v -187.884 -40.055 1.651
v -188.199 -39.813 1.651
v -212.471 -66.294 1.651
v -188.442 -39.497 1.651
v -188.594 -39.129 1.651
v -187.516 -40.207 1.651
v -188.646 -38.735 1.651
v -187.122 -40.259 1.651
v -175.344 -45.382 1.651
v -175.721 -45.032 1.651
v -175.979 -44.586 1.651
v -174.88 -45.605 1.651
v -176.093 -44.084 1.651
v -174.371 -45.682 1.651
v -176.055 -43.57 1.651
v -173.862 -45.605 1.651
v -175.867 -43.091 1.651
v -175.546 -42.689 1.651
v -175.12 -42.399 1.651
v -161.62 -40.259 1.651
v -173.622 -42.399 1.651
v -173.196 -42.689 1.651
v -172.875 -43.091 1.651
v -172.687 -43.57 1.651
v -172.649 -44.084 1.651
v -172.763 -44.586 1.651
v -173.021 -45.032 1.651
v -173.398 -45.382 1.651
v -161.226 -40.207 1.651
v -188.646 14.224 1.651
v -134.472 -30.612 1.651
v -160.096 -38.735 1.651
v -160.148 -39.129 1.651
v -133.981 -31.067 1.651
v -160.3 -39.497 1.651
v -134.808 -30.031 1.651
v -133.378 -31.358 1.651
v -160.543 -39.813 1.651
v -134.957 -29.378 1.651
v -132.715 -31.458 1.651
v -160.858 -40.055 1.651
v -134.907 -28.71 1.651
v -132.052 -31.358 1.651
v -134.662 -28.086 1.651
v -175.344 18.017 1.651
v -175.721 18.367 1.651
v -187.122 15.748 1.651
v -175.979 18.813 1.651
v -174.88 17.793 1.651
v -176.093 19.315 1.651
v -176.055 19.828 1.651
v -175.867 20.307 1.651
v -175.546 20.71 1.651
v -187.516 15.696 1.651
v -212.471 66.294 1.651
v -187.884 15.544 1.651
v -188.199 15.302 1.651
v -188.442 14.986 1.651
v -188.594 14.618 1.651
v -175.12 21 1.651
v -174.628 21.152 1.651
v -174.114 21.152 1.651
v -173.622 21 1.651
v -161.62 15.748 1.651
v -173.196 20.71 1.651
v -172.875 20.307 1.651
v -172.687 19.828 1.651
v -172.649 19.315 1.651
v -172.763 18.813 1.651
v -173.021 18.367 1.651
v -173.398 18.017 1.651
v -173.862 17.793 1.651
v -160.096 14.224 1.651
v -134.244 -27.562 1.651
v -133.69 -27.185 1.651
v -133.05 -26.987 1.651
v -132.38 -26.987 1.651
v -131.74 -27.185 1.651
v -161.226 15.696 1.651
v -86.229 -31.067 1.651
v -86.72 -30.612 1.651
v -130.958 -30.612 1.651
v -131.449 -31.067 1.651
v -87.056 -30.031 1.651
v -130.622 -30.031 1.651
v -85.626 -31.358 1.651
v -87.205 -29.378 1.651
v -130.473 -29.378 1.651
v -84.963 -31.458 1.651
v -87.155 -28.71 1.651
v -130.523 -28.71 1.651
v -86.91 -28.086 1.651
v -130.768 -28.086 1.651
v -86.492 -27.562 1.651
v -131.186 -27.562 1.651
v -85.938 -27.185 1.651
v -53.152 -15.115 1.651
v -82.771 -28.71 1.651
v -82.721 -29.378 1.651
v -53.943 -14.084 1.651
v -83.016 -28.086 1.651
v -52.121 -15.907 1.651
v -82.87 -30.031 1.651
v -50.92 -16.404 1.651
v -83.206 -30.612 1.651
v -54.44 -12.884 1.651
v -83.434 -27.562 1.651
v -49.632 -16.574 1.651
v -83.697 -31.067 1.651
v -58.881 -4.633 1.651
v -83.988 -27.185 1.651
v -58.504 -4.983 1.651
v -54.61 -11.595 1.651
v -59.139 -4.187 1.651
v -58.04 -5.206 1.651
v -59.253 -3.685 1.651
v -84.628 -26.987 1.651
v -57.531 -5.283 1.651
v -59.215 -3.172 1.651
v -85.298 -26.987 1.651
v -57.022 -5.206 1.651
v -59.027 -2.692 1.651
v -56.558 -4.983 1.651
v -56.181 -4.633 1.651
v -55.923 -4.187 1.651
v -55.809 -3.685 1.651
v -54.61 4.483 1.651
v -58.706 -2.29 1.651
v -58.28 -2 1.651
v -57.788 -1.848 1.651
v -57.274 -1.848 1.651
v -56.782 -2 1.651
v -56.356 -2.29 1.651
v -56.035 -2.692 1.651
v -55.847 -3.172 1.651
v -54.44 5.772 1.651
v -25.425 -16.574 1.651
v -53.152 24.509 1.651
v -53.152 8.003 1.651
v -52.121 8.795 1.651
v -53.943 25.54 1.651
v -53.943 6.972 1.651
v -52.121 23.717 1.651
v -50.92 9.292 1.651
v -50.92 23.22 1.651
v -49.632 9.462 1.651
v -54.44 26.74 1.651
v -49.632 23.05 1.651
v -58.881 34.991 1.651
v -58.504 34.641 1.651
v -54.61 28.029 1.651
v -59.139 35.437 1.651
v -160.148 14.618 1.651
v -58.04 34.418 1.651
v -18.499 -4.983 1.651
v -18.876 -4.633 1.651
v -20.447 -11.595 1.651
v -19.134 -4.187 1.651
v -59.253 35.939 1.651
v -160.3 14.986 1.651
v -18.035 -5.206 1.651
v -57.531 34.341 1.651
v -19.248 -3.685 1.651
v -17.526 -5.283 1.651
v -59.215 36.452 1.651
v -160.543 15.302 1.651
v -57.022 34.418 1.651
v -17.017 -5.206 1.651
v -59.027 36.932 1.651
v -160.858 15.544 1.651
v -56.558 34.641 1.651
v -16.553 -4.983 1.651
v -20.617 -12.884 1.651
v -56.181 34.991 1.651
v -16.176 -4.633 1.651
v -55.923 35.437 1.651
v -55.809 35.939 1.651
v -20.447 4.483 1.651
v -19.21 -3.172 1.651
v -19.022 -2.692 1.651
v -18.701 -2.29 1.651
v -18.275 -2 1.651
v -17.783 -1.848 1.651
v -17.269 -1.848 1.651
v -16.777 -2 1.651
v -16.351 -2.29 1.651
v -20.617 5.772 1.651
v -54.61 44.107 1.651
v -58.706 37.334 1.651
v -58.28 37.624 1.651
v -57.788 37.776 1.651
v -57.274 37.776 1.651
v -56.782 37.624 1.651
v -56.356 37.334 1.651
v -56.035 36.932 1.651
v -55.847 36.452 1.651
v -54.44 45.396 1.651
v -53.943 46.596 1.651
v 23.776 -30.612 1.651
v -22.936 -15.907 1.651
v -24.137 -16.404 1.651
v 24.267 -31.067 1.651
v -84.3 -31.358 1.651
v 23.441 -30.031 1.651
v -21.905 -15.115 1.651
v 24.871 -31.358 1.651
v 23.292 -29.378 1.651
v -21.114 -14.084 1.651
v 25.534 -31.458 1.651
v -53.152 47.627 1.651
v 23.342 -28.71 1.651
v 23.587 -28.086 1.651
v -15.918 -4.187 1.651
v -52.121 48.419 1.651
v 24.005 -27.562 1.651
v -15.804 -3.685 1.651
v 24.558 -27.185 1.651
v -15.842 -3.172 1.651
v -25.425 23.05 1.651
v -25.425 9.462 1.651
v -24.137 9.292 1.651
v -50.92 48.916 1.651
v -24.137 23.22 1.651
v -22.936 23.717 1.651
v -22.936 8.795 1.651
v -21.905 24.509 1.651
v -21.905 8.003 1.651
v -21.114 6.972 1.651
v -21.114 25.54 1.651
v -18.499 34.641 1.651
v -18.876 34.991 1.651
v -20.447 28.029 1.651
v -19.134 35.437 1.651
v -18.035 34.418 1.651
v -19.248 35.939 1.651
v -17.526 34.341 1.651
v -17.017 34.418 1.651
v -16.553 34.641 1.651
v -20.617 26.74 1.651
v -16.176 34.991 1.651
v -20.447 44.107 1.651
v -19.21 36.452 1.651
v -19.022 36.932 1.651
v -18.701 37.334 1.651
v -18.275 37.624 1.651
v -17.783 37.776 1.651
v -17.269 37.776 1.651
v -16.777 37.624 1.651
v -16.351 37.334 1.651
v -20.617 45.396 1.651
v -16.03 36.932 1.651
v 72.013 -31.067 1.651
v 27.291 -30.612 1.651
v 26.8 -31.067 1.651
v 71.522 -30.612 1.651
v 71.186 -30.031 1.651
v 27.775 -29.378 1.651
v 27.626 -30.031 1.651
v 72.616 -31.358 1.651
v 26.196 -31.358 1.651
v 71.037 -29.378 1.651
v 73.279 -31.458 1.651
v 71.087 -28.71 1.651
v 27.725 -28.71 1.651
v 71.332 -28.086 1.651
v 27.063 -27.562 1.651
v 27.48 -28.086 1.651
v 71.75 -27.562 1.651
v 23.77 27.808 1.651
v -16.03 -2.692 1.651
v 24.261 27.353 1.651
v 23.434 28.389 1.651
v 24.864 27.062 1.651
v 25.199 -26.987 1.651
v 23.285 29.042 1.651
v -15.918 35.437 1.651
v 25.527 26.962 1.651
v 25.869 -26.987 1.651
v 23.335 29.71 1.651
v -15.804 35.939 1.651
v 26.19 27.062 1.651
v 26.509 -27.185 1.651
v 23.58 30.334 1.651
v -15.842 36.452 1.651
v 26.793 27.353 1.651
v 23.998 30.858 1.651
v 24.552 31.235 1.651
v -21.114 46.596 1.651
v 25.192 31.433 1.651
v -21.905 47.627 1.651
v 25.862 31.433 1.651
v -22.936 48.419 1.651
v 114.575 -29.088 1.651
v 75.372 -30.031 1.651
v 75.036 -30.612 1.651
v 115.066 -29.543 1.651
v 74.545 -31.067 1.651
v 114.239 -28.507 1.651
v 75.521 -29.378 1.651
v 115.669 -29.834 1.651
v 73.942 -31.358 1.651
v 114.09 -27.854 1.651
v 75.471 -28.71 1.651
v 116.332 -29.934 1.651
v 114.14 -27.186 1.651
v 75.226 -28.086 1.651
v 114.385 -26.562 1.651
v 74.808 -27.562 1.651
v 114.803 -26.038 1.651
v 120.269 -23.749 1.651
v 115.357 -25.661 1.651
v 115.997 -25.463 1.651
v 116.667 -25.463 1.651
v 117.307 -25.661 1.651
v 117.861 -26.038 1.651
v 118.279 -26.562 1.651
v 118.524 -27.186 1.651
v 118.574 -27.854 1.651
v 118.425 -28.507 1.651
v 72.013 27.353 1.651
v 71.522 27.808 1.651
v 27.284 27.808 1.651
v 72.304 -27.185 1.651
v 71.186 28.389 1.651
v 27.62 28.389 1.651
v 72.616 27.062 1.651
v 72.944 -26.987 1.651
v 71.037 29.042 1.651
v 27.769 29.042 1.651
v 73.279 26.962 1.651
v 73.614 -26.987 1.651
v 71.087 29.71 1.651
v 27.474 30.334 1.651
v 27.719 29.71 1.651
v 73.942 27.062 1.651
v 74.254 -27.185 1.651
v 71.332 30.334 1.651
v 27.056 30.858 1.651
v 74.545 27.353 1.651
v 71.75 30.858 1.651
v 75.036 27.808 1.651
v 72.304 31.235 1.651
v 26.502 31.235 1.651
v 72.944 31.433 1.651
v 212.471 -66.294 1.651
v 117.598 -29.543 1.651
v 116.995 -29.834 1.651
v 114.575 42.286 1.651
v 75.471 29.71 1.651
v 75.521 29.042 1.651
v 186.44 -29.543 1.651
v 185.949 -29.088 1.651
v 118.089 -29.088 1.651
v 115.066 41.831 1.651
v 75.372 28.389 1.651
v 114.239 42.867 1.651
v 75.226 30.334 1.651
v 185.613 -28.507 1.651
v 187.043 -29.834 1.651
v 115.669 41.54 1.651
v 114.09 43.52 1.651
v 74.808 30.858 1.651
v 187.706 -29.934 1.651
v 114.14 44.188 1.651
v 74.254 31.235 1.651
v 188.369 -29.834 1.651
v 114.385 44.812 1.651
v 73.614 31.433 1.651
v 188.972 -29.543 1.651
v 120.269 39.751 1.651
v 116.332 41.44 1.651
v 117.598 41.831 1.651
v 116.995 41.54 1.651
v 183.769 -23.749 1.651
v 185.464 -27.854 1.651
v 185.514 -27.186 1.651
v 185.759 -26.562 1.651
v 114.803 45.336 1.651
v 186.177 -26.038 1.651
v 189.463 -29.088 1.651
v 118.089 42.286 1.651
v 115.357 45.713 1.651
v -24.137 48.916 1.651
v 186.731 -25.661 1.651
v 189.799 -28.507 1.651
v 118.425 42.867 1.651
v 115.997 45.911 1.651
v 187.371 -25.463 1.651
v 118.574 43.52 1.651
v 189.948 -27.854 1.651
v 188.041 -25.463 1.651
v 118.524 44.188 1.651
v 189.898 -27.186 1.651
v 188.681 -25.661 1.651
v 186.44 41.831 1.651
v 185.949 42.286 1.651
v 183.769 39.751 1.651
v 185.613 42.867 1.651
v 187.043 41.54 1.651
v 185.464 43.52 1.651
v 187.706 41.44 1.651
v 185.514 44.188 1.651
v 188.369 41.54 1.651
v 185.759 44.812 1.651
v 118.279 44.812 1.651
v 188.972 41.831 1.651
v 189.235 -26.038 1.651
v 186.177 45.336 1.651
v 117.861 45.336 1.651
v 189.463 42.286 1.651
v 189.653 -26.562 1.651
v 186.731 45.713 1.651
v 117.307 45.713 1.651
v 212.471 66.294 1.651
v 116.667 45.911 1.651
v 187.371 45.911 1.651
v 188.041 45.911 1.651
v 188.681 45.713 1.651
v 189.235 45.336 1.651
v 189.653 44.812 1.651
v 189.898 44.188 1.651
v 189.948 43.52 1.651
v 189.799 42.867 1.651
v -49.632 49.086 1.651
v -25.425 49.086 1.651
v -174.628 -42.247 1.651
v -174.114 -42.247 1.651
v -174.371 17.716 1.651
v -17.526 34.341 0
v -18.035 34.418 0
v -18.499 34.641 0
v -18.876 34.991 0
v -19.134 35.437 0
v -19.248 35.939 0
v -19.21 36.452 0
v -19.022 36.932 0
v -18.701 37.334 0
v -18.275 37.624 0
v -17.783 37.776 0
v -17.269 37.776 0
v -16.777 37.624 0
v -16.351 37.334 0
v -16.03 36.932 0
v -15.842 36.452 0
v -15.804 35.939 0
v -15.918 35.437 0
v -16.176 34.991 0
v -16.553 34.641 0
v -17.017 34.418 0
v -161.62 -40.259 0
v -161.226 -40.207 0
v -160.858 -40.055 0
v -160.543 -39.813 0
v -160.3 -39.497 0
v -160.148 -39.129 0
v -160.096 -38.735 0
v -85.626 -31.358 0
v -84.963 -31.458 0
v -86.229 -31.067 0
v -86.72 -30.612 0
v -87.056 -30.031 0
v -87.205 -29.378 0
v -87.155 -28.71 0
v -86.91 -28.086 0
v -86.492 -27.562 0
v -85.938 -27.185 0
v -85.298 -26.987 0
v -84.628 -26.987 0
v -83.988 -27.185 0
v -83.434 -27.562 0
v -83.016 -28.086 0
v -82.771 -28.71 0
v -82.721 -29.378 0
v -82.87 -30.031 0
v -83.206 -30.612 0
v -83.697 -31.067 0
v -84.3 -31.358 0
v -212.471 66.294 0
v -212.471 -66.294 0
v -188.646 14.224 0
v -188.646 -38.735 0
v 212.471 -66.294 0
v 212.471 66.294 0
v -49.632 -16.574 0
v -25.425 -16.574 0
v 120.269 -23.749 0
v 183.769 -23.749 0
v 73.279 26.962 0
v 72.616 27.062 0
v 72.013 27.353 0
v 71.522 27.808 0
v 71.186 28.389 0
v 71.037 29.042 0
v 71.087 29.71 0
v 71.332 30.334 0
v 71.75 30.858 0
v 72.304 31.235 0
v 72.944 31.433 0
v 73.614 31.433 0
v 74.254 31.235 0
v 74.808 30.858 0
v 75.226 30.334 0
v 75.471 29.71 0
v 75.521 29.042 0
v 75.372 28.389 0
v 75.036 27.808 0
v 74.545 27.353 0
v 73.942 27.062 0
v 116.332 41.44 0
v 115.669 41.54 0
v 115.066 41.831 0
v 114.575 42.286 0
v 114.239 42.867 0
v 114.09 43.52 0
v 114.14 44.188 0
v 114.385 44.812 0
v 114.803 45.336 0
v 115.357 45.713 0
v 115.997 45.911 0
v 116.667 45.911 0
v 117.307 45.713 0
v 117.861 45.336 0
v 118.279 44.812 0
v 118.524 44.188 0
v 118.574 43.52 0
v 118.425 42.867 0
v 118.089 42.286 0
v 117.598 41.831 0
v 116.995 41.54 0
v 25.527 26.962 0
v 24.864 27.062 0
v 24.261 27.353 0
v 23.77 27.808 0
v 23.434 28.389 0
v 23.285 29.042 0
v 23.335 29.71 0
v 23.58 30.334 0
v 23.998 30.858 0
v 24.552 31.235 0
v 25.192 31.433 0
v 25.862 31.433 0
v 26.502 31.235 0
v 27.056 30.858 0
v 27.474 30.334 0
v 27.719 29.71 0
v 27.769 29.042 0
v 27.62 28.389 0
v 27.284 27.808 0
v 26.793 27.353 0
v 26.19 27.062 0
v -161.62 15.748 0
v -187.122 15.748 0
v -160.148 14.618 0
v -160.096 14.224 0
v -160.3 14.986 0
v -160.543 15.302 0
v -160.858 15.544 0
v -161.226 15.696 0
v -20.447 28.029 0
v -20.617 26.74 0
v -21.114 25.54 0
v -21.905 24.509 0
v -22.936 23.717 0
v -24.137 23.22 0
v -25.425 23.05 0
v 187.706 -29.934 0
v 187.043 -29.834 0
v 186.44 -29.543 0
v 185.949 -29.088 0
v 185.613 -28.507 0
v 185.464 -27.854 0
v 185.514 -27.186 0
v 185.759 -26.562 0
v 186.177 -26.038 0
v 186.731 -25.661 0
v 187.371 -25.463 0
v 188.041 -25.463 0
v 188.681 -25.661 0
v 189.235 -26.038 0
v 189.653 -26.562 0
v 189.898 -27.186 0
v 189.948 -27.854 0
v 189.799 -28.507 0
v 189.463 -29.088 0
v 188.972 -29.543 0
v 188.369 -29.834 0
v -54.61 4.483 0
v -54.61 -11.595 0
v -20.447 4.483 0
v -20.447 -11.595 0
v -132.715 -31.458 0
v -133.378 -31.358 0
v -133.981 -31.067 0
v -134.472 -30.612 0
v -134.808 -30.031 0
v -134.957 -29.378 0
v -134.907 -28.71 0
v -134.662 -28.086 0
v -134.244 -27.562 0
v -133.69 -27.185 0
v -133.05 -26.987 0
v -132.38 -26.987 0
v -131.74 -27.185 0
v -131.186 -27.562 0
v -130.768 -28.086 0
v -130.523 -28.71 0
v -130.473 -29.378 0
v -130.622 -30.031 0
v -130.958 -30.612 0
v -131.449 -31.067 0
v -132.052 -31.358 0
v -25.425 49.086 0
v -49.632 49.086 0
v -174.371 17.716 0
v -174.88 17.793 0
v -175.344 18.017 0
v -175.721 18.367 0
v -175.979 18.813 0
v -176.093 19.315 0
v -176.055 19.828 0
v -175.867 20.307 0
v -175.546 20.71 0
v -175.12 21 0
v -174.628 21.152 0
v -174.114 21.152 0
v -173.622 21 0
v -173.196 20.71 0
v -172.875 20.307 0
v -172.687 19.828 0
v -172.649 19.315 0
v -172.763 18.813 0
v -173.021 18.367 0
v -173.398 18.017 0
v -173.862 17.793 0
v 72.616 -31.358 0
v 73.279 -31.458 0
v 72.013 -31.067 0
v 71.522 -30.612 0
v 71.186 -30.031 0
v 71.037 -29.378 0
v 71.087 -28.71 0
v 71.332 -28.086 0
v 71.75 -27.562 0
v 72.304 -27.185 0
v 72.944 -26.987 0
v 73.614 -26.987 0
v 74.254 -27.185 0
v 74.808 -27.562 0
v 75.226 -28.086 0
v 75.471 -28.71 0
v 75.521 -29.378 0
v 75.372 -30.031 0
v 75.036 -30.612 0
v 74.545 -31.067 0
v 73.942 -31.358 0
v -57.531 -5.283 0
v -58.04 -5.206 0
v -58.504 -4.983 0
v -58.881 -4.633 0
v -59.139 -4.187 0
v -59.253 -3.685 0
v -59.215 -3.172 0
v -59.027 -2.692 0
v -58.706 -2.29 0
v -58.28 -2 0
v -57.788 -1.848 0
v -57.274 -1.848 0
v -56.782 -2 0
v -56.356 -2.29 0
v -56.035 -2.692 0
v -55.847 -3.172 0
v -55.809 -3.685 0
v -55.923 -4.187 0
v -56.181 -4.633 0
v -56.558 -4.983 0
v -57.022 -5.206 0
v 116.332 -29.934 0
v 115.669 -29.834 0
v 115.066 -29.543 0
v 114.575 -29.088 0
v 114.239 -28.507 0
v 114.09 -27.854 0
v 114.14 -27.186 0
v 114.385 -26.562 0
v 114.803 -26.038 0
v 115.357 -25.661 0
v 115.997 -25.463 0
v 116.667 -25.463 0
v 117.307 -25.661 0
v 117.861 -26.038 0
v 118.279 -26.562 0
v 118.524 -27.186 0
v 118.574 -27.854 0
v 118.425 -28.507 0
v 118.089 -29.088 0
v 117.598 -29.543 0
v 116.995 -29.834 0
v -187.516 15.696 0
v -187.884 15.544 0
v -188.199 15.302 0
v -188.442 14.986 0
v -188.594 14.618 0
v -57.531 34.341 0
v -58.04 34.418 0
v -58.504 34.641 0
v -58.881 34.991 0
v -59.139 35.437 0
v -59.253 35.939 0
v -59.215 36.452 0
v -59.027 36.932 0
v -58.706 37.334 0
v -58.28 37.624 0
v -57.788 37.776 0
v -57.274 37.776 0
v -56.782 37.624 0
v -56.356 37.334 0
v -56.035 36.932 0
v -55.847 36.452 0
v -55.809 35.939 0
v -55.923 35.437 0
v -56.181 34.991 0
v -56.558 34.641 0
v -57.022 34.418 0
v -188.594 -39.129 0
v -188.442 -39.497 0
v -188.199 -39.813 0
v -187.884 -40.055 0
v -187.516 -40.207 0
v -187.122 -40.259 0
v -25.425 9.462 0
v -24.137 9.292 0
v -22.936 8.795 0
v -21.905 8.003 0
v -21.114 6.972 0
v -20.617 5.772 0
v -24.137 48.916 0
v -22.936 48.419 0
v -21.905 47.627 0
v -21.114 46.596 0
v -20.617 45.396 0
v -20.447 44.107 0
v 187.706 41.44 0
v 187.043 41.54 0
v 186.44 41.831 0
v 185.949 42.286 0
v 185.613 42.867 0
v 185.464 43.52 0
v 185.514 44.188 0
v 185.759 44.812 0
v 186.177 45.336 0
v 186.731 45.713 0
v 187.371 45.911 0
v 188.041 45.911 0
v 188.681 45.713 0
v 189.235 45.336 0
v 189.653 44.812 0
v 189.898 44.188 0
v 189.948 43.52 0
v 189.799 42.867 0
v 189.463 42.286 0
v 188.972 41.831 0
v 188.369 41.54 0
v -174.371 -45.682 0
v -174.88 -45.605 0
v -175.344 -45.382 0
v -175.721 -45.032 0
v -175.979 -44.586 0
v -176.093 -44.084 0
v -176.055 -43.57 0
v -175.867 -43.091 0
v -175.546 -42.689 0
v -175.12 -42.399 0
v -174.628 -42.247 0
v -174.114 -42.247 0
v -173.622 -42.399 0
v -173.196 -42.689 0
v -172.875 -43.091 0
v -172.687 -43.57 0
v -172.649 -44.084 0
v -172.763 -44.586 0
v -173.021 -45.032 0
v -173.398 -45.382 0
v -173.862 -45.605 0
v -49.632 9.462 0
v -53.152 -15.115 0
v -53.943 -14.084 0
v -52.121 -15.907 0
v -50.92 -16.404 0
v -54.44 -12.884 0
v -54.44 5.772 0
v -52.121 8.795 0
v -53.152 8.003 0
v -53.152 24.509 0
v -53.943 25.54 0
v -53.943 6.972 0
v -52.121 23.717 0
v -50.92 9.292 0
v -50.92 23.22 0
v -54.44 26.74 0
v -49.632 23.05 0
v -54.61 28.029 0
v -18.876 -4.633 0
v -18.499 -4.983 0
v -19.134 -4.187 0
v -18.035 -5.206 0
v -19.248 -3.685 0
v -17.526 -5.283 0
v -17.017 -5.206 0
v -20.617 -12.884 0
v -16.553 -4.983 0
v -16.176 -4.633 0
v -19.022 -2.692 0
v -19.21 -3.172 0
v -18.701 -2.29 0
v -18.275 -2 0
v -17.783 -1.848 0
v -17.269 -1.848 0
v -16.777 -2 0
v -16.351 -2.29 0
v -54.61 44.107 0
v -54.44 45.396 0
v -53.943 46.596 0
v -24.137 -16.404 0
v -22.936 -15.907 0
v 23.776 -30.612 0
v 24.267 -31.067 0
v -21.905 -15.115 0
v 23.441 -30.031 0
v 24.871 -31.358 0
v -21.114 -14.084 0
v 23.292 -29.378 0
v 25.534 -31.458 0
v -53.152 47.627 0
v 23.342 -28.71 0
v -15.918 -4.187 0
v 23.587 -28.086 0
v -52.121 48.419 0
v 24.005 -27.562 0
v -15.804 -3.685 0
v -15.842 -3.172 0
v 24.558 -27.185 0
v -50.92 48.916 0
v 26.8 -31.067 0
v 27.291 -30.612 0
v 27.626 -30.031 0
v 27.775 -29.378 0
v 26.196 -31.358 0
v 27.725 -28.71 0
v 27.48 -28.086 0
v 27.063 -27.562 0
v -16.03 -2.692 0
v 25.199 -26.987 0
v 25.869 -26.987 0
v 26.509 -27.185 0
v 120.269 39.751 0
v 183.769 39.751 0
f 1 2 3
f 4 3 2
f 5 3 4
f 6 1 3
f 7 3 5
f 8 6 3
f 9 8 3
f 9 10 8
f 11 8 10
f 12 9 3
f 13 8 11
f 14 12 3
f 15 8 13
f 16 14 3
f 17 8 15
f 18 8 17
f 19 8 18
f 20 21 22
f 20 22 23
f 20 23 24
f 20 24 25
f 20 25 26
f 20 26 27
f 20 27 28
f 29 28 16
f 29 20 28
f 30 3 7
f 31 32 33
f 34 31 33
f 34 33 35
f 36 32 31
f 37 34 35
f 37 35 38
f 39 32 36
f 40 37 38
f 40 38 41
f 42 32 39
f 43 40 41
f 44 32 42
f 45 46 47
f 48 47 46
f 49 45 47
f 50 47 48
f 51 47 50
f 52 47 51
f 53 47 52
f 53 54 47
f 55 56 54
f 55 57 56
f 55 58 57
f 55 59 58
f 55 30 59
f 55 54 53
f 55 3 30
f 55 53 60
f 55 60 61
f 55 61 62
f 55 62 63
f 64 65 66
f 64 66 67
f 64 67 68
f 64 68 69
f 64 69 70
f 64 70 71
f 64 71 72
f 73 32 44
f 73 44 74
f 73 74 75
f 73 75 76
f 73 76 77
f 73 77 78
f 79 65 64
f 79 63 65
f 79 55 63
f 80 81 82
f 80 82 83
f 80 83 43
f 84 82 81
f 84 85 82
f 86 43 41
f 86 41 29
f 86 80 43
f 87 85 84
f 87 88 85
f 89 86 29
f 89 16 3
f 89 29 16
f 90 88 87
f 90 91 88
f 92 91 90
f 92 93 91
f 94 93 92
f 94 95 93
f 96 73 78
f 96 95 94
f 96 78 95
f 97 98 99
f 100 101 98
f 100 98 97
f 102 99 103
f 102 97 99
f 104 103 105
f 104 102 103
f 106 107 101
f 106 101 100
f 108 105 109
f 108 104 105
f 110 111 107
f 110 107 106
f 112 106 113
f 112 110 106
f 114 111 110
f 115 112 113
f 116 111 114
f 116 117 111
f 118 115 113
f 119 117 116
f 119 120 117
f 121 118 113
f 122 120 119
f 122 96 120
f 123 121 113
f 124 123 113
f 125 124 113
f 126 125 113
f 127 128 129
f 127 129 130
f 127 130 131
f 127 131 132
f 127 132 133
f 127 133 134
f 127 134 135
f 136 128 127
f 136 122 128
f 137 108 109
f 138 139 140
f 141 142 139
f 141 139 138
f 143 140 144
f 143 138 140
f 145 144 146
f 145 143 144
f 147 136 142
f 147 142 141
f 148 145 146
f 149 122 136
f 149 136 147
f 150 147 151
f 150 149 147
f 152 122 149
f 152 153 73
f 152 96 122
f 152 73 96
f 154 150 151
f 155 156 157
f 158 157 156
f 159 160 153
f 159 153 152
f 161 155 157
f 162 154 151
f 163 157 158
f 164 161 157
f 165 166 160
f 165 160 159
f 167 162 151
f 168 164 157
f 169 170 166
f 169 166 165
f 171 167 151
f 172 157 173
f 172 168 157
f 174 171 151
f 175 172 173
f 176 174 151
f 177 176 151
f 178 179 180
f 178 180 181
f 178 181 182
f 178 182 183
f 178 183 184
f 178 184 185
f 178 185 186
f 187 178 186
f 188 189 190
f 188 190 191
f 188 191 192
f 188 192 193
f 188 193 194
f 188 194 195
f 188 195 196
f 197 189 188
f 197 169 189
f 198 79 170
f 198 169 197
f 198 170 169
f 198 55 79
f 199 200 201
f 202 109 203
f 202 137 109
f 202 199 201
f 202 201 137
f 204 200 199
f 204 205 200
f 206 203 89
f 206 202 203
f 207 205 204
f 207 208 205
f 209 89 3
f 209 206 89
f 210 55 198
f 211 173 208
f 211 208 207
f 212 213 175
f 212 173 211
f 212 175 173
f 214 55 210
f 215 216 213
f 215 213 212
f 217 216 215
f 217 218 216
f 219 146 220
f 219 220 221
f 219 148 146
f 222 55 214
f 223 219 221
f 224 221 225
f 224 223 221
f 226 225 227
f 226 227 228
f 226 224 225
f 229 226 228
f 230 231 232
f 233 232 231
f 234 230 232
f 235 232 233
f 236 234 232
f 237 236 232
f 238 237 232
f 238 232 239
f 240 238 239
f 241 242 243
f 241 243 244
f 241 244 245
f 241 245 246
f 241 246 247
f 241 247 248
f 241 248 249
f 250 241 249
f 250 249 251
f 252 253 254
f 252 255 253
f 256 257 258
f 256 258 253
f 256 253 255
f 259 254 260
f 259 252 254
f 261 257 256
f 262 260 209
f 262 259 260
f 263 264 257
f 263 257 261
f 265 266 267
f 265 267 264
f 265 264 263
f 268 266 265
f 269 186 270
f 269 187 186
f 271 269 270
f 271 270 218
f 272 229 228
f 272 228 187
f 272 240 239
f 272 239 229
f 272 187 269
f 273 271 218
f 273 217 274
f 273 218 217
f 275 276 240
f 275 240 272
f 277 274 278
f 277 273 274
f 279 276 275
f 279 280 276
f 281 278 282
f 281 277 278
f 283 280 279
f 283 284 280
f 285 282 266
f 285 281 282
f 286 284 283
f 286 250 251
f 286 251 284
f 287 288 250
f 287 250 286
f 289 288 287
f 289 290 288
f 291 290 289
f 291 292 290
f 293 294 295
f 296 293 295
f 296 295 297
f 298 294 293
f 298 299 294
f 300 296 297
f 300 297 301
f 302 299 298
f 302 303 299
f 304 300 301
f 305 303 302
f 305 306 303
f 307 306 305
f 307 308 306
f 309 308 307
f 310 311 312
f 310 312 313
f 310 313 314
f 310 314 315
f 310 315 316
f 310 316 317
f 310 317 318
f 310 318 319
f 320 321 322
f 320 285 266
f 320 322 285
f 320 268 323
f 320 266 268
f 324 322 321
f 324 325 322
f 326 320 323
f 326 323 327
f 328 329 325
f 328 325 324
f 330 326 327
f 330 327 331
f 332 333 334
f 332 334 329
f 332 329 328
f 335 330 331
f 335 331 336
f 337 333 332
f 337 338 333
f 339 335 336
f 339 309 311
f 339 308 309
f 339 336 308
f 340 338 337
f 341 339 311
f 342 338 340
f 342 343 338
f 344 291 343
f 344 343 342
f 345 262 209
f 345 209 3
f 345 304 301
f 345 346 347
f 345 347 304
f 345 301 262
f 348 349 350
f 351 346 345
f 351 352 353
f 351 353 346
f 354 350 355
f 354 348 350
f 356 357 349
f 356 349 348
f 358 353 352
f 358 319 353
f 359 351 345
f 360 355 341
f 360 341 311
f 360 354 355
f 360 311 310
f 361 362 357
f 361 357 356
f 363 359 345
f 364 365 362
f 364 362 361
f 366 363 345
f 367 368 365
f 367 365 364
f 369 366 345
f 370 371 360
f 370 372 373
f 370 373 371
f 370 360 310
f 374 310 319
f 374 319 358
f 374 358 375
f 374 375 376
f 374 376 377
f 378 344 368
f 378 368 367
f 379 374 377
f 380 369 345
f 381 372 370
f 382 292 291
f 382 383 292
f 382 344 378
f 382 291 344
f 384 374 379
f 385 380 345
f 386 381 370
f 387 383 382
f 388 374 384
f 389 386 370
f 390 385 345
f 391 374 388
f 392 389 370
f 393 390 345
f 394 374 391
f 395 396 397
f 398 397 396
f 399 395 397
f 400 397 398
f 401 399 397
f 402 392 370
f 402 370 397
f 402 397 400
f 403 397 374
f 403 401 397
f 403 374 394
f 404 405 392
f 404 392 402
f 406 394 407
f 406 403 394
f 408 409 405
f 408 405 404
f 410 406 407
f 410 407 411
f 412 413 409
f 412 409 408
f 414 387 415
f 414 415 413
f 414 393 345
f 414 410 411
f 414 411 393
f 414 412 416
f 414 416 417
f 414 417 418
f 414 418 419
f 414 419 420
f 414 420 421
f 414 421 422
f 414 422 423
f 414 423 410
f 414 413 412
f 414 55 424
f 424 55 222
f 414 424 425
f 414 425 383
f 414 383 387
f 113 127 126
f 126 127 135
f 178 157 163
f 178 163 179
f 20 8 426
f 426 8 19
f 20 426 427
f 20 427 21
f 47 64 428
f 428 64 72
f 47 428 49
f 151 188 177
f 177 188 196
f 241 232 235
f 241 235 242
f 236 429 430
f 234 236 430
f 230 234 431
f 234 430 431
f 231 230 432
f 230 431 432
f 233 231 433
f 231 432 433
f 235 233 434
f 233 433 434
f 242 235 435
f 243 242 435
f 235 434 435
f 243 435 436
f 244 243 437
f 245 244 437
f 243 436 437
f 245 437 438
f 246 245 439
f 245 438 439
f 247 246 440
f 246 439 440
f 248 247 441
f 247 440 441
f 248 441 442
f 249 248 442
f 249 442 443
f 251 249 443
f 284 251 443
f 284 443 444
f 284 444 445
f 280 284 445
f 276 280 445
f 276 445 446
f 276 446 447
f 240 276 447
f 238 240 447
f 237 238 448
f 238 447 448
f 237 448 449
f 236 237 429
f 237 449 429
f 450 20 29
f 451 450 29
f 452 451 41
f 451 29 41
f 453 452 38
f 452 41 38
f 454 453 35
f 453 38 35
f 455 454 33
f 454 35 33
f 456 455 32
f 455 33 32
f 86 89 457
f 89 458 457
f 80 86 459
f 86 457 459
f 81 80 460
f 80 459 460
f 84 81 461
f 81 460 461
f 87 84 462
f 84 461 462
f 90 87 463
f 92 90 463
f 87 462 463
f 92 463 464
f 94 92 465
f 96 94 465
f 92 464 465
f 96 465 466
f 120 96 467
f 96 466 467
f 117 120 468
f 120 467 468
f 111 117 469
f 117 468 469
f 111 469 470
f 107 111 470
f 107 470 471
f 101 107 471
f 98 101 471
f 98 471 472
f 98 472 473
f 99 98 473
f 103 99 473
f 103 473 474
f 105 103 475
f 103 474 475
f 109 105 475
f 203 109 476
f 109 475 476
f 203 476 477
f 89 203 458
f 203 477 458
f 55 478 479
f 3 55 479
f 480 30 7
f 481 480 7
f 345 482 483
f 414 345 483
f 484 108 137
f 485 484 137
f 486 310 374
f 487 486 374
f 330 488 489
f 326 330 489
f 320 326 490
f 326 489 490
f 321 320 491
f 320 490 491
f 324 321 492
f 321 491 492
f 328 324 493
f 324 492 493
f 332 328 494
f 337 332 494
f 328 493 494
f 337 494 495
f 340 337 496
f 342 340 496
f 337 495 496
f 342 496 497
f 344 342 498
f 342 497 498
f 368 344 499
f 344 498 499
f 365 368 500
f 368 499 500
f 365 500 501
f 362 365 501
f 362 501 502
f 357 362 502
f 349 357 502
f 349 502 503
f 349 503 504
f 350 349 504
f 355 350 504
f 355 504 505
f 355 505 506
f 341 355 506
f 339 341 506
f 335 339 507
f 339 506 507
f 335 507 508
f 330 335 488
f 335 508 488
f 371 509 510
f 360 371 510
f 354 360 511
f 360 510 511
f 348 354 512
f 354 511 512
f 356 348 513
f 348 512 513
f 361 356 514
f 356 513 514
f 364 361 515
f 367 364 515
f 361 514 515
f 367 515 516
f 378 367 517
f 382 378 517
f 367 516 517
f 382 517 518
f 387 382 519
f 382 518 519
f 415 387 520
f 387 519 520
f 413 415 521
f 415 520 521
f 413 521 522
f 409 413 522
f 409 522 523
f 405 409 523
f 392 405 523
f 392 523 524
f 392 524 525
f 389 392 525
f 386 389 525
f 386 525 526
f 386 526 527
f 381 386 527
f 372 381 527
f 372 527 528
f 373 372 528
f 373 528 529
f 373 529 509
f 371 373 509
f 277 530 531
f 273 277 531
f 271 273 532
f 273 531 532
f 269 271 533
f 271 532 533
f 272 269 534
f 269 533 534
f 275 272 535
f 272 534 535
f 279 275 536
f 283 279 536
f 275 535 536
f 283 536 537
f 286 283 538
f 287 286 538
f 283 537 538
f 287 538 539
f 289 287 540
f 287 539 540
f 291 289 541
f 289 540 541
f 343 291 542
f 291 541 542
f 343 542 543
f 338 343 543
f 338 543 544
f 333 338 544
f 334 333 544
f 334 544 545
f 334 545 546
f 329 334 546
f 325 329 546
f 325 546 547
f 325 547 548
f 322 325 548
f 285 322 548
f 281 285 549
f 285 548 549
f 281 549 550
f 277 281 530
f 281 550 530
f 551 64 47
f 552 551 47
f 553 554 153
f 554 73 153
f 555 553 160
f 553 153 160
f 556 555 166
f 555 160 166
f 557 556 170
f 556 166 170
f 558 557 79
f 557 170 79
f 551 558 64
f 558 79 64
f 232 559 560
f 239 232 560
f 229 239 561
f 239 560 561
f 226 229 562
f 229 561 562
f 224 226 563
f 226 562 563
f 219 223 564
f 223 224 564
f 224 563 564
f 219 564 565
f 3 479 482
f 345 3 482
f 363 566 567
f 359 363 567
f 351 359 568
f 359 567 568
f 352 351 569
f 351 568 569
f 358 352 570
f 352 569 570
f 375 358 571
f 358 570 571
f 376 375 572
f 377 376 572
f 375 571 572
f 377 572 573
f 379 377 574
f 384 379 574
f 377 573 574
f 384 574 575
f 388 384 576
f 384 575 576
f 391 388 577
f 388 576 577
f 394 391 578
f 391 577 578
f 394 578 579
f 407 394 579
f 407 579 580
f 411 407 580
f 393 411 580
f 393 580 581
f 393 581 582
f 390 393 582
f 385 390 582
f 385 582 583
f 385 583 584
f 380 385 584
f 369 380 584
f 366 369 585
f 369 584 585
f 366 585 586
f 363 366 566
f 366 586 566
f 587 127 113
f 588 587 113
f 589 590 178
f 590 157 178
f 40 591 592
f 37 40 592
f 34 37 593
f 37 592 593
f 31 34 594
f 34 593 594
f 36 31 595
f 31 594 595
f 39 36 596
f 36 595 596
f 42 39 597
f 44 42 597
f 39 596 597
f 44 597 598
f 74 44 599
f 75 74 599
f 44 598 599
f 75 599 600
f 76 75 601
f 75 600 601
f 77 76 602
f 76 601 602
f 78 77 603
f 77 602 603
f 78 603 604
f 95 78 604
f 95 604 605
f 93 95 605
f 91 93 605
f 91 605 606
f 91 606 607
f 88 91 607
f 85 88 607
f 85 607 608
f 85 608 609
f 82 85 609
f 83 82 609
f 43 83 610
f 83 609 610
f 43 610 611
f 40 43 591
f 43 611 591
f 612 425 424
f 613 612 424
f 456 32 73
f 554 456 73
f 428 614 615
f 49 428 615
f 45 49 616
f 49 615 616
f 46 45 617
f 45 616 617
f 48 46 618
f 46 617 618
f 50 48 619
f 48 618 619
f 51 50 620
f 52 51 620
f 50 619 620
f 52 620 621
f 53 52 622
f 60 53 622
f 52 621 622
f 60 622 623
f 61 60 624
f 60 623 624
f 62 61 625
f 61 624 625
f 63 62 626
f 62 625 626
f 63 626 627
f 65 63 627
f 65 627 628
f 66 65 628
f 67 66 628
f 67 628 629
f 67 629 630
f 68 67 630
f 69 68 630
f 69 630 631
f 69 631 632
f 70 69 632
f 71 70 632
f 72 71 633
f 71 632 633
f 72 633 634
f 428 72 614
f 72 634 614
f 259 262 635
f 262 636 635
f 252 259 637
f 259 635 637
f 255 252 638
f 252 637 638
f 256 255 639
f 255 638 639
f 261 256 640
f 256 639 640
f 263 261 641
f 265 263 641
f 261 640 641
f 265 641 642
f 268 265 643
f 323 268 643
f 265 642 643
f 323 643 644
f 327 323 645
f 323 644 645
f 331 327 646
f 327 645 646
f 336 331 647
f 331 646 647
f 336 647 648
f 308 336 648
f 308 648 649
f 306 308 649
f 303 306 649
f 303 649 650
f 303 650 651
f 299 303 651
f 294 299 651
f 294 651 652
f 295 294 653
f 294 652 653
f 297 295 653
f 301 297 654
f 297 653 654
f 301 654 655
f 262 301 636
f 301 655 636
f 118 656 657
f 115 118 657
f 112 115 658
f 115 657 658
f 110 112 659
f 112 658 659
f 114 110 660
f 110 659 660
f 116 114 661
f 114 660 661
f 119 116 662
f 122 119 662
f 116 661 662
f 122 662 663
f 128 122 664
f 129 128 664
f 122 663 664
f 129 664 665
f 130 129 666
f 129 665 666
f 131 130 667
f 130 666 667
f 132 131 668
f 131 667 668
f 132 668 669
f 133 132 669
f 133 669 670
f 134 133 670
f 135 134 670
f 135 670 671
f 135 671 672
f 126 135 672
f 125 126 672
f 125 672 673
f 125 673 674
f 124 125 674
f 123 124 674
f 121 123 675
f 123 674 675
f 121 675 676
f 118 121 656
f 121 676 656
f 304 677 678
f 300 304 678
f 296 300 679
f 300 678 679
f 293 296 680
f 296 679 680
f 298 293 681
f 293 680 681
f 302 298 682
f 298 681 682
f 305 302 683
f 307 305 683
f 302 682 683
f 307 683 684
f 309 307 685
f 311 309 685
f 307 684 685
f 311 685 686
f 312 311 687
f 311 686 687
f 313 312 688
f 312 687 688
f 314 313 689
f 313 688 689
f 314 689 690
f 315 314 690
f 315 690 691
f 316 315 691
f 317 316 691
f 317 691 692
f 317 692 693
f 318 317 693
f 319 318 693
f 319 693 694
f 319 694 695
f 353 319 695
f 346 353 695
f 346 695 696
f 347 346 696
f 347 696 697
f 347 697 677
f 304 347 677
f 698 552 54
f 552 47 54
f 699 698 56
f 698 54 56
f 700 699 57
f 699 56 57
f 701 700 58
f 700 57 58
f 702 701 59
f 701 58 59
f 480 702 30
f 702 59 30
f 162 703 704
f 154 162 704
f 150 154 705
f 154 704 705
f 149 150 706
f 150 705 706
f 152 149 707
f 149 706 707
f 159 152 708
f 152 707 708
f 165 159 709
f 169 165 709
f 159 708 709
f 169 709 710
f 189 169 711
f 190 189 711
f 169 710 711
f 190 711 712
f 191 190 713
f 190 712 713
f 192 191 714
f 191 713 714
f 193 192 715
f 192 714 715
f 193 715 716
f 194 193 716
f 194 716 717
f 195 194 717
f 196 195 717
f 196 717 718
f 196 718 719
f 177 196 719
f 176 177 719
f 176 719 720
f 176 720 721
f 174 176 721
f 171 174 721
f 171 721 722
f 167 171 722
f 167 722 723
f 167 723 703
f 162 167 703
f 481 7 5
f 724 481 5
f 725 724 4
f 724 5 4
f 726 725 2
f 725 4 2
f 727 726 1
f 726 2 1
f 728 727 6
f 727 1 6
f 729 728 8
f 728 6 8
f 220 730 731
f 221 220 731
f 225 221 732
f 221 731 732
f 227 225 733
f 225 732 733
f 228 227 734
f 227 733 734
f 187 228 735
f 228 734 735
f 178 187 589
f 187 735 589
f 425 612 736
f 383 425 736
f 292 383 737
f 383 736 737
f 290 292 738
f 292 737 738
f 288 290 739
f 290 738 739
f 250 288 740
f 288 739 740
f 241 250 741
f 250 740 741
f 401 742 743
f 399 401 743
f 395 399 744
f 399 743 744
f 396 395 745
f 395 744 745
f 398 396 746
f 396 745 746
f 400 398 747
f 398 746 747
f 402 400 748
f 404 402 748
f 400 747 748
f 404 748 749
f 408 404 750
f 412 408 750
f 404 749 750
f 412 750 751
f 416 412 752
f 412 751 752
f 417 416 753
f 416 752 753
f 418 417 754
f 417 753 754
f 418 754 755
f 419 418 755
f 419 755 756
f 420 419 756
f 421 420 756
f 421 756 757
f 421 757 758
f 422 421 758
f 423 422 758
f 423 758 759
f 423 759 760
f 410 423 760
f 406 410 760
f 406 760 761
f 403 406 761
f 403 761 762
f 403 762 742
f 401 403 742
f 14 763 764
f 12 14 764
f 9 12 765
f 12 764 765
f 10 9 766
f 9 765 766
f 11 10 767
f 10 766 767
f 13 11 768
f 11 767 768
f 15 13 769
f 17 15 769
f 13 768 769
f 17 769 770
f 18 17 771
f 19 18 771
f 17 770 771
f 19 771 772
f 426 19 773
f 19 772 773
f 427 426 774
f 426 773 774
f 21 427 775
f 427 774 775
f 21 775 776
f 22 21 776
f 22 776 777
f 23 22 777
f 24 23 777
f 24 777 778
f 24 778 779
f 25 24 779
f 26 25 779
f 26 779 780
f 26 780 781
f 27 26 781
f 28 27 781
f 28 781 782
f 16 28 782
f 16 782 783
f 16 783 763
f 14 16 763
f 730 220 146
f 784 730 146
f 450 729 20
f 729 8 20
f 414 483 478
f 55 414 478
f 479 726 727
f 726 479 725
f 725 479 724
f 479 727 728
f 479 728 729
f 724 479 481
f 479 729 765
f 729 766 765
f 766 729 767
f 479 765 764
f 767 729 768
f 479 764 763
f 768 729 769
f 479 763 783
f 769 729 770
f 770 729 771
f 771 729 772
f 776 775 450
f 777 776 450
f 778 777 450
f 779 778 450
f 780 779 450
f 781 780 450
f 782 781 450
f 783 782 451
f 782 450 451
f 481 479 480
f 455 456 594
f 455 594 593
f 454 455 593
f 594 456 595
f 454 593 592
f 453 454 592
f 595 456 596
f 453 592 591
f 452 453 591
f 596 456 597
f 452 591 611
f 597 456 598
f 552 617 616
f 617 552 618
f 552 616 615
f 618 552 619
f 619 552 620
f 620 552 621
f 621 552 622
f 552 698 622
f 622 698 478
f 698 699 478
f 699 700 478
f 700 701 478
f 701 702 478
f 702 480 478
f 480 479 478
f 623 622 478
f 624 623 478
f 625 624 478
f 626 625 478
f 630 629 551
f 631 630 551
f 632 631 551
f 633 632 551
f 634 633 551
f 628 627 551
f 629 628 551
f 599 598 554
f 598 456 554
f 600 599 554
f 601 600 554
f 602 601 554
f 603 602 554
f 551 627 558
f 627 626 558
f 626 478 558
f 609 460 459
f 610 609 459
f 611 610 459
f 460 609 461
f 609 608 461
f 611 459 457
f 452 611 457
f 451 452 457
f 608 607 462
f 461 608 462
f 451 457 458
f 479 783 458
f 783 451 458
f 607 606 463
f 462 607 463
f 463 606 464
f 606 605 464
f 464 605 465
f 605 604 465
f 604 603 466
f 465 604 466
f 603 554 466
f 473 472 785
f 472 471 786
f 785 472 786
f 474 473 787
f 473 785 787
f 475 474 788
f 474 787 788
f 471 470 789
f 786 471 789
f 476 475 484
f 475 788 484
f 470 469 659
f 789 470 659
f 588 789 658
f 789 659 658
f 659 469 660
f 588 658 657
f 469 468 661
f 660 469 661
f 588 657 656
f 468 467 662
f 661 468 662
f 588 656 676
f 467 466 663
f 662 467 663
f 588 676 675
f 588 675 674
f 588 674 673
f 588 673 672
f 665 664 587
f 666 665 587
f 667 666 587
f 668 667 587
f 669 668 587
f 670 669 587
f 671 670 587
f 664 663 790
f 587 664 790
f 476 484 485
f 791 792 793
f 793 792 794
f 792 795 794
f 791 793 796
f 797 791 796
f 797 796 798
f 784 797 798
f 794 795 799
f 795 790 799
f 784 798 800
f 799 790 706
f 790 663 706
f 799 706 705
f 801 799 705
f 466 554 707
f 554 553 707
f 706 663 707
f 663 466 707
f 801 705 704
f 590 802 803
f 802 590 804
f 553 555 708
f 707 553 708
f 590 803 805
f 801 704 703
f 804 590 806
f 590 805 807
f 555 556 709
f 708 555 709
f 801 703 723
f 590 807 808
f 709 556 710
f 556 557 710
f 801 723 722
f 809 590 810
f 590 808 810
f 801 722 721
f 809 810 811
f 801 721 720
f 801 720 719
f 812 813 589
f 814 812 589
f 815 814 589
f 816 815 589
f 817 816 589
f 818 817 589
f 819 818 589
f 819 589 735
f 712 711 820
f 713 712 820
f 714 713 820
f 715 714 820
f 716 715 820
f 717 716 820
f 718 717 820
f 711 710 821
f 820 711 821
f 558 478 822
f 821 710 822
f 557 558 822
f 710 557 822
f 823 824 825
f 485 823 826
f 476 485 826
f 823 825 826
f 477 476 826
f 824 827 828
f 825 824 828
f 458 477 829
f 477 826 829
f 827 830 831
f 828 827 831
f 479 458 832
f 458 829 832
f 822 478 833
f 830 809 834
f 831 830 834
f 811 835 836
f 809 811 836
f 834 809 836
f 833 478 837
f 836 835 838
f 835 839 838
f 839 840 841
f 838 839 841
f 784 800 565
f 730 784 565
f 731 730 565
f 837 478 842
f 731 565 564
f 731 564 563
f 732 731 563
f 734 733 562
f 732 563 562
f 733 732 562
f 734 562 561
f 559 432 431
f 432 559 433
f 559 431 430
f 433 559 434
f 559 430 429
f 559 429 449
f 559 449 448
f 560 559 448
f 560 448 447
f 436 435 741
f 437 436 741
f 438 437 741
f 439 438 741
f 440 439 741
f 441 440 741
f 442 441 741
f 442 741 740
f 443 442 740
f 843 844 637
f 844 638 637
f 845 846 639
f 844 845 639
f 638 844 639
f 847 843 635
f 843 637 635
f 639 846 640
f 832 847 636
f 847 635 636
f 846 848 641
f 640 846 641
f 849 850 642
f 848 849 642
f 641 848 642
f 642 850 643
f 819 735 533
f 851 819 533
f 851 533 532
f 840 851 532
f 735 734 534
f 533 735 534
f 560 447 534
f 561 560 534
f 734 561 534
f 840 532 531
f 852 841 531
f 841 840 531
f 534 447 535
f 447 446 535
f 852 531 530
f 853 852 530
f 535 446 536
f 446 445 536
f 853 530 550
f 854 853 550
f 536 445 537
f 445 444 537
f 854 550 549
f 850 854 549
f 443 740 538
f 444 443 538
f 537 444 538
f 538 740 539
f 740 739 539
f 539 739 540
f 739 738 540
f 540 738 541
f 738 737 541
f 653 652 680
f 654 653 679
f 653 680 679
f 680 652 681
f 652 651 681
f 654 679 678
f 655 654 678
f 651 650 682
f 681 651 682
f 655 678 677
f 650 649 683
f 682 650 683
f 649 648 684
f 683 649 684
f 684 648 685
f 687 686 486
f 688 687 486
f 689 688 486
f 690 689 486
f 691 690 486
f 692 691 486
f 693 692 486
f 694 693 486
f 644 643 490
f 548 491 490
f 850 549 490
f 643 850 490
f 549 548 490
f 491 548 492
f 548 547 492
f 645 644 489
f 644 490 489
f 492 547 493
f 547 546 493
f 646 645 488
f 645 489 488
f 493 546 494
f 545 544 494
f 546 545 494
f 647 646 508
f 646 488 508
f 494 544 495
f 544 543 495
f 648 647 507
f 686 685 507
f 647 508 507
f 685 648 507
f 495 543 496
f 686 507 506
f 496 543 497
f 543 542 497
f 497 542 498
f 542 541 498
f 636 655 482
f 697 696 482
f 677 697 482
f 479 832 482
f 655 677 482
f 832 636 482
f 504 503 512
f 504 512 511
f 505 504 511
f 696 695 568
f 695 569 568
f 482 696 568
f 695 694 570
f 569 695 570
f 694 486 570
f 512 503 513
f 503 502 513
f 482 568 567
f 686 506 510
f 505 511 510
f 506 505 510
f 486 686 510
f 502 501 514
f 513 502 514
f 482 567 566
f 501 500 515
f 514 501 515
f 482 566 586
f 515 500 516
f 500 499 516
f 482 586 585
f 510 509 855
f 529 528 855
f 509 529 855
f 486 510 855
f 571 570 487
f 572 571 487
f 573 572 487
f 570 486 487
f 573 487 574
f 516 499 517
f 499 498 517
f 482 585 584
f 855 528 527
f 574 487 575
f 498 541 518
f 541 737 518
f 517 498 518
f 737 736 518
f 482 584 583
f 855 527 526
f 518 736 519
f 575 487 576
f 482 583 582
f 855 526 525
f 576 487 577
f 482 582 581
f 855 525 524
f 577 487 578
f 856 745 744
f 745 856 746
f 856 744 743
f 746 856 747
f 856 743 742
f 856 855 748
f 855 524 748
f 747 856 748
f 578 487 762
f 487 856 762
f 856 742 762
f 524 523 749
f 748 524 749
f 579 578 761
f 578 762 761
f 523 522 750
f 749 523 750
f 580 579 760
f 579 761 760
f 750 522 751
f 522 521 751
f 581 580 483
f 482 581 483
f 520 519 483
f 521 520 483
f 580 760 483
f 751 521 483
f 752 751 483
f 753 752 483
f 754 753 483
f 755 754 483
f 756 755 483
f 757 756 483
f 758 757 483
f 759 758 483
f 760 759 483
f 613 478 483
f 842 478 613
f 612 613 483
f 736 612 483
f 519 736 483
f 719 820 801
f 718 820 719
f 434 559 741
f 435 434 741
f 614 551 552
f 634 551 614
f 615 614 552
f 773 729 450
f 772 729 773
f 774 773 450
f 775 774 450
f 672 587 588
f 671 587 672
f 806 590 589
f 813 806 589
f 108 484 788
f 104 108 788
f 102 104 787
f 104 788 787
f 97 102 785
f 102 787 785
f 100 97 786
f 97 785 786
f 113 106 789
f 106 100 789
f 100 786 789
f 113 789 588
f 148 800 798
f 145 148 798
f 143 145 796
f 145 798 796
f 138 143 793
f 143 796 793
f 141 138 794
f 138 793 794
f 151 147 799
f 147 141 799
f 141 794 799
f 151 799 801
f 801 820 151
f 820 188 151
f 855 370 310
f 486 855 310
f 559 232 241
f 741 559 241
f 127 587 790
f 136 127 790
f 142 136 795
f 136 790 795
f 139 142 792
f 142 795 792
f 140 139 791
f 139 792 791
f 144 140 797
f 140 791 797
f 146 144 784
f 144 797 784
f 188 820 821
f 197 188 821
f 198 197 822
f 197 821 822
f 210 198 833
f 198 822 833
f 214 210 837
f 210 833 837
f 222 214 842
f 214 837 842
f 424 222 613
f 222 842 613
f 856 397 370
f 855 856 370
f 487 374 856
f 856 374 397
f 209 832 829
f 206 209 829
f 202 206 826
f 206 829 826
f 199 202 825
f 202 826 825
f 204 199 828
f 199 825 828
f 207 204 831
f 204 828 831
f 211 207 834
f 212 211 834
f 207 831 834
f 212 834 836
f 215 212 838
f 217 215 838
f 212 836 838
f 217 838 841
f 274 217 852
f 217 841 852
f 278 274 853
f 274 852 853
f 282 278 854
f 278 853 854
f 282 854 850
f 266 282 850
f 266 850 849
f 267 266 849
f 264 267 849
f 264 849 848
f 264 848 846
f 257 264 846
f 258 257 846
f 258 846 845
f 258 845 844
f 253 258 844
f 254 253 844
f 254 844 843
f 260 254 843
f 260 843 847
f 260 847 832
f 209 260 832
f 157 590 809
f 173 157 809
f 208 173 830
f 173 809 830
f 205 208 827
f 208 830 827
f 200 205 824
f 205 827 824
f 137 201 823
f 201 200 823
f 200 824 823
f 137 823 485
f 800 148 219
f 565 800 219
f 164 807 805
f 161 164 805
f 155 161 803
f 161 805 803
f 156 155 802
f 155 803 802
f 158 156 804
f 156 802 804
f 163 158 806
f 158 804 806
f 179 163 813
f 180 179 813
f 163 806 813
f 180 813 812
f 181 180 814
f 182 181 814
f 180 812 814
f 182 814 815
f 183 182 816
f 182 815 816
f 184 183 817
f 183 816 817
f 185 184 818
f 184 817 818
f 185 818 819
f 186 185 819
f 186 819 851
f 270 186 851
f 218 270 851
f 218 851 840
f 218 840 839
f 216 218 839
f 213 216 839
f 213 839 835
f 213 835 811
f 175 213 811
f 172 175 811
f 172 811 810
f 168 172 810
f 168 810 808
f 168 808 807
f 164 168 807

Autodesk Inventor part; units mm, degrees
ref_plane "YZ Plane" through (0, 0, 0) normal (1, 0, 0) x (0, 1, 0)
ref_plane "XZ Plane" through (0, 0, 0) normal (0, 1, 0) x (-1, 0, 0)
ref_plane "XY Plane" through (0, 0, 0) normal (0, 0, 1) x (1, 0, 0)
sketch "Sketch1" plane through (0, 0, 0) normal (0, 0, 1) x (1, 0, 0)
  line L0 (-212.471, -66.294) -> (212.471, -66.294)
  line L1 (212.471, -66.294) -> (212.471, 66.294)
  line L2 (212.471, 66.294) -> (-212.471, 66.294)
  line L3 (-212.471, 66.294) -> (-212.471, -66.294)
  line L4 (-212.471, -66.294) -> (212.471, 66.294) construction
  line L5 (212.471, -66.294) -> (-212.471, 66.294) construction
  point P0 (0, 0)
  dimension "d0" = 424.942
  dimension "d1" = 132.588
extrude "PDU back" add sketch "Sketch1" along normal blind 1.651
sketch "pwr entry" plane through (0, 0, 1.651) normal (0, 0, 1) x (1, 0, 0)
  line L0 (-187.1218, -40.259) -> (-161.6202, -40.259)
  line L1 (-160.0962, -38.735) -> (-160.0962, 14.224)
  line L2 (-161.6202, 15.748) -> (-187.1218, 15.748)
  line L3 (-188.6458, 14.224) -> (-188.6458, -38.735)
  line L4 (-188.6458, -40.259) -> (-160.0962, 15.748) construction
  line L5 (-160.0962, -40.259) -> (-188.6458, 15.748) construction
  line L6 (-174.371, 19.4437) -> (-174.371, -43.9547) construction
  line L7 (-212.471, 66.294) -> (-212.471, -66.294) projected
  line L8 (-212.471, -66.294) -> (212.471, -66.294) projected
  arc A0 (-160.0962, 14.224) -> (-161.6202, 15.748) centre (-161.6202, 14.224) ccw
  arc A1 (-187.1218, 15.748) -> (-188.6458, 14.224) centre (-187.1218, 14.224) ccw
  arc A2 (-188.6458, -38.735) -> (-187.1218, -40.259) centre (-187.1218, -38.735) ccw
  arc A3 (-161.6202, -40.259) -> (-160.0962, -38.735) centre (-161.6202, -38.735) ccw
  point P0 (0, 0)
  point P1 (-174.371, -12.2555)
  point P2 (-174.371, -12.2555)
  dimension "d4" = 56.007
  dimension "d5" = 28.5496
  dimension "d6" = 63.3984
  dimension "d7" = 38.1
  dimension "d8" = 22.3393
  dimension "d9" = 1.524
extrude "pwr entry cutout" cut sketch "pwr entry" against normal through all
hole "pwr entry holes" at (-174.371, 19.4437, 1.651) at (-174.371, -43.9547, 1.651) direction (0, 0, -1) diameter 3.4544 end through all
sketch "IEC outlet" plane through (0, 0, 1.651) normal (0, 0, 1) x (1, 0, 0)
  line L0 (-54.61, -16.5735) -> (-20.447, -16.5735)
  line L1 (-20.447, -16.5735) -> (-20.447, 9.4615)
  line L2 (-20.447, 9.4615) -> (-54.61, 9.4615)
  line L3 (-54.61, 9.4615) -> (-54.61, -16.5735)
  line L4 (-54.61, -16.5735) -> (-20.447, 9.4615) construction
  line L5 (-20.447, -16.5735) -> (-54.61, 9.4615) construction
  line L6 (-57.531, -3.556) -> (-17.526, -3.556) construction
  line L7 (-212.471, 66.294) -> (-212.471, -66.294) projected
  line L8 (-212.471, -66.294) -> (212.471, -66.294) projected
  line L9 (-54.61, 23.0505) -> (-20.447, 23.0505)
  line L10 (-20.447, 23.0505) -> (-20.447, 49.0855)
  line L11 (-20.447, 49.0855) -> (-54.61, 49.0855)
  line L12 (-54.61, 49.0855) -> (-54.61, 23.0505)
  line L13 (-54.61, 23.0505) -> (-20.447, 49.0855) construction
  line L14 (-20.447, 23.0505) -> (-54.61, 49.0855) construction
  line L15 (-57.531, 36.068) -> (-17.526, 36.068) construction
  point P0 (0, 0)
  point P1 (-37.5285, -3.556)
  point P2 (-37.5285, -3.556)
  point P3 (0, 39.624)
  point P4 (-37.5285, 36.068)
  point P5 (-37.5285, 36.068)
  dimension "d19" = 26.035
  dimension "d20" = 34.163
  dimension "d22" = 40.005
  dimension "d23" = 154.94
  dimension "d24" = 62.738
  dimension "d27" = 39.624
hole "IEC holes" at (-17.526, -3.556, 1.651) at (-57.531, -3.556, 1.651) at (-57.531, 36.068, 1.651) at (-17.526, 36.068, 1.651) direction (0, 0, -1) diameter 3.4544 end through all
extrude "IEC cutout" cut sketch "IEC outlet" against normal blind 25.4
sketch "airflow" plane through (0, 0, 1.651) normal (0, 0, 1) x (1, 0, 0)
  line L0 (110.109, -33.909) -> (193.929, -33.909) construction
  line L1 (193.929, -33.909) -> (193.929, 49.911) construction
  line L2 (193.929, 49.911) -> (110.109, 49.911) construction
  line L3 (110.109, 49.911) -> (110.109, -33.909) construction
  line L4 (110.109, -33.909) -> (193.929, 49.911) construction
  line L5 (193.929, -33.909) -> (110.109, 49.911) construction
  line L6 (-212.471, 66.294) -> (-212.471, -66.294) projected
  line L7 (-212.471, -66.294) -> (212.471, -66.294) projected
  line L8 (120.269, -23.749) -> (183.769, -23.749)
  line L9 (183.769, -23.749) -> (183.769, 39.751)
  line L10 (183.769, 39.751) -> (120.269, 39.751)
  line L11 (120.269, 39.751) -> (120.269, -23.749)
  line L12 (120.269, -23.749) -> (183.769, 39.751) construction
  line L13 (183.769, -23.749) -> (120.269, 39.751) construction
  line L14 (116.332, -27.686) -> (187.706, -27.686) construction
  line L15 (187.706, -27.686) -> (187.706, 43.688) construction
  line L16 (187.706, 43.688) -> (116.332, 43.688) construction
  line L17 (116.332, 43.688) -> (116.332, -27.686) construction
  line L18 (116.332, -27.686) -> (187.706, 43.688) construction
  line L19 (187.706, -27.686) -> (116.332, 43.688) construction
  point P0 (0, 0)
  point P1 (152.019, 8.001)
  dimension "d43" = 83.82
  dimension "d44" = 83.82
  dimension "d45" = 322.58
  dimension "d46" = 32.385
  dimension "d47" = 63.5
  dimension "d48" = 71.374
hole "airflow holes" at (187.706, 43.688, 1.651) at (116.332, 43.688, 1.651) at (116.332, -27.686, 1.651) at (187.706, -27.686, 1.651) direction (0, 0, -1) diameter 4.4958 end through all
extrude "airflow cutout" cut sketch "airflow" against normal through all
fillet "IEC fillet 1" radius 4.9784 4 edges at (-54.61, 49.0855, 0.8255) (-20.447, 49.0855, 0.8255) (-20.447, 23.0505, 0.8255) (-54.61, 23.0505, 0.8255)
fillet "IEC fillet 2" radius 4.9784 4 edges at (-54.61, 9.4615, 0.8255) (-54.61, -16.5735, 0.8255) (-20.447, 9.4615, 0.8255) (-20.447, -16.5735, 0.8255)
sketch "Sketch5" plane through (0, 0, 0) normal (0, 0, -1) x (-1, 0, 0)
  circle A0 centre (-116.332, 43.688) radius 2.2479 construction
  circle A1 centre (-116.332, -27.686) radius 2.2479 construction
  circle A2 centre (-116.332, -27.686) radius 2.2479 construction
  line L0 (-116.332, 43.688) -> (-116.332, -27.686) construction
  circle A3 centre (17.526, 36.068) radius 1.7272 construction
  circle A4 centre (17.526, -3.556) radius 1.7272 construction
  line L1 (17.526, 36.068) -> (17.526, -3.556) construction
  line L2 (-73.279, 29.21) -> (-25.527, 29.21) construction
  line L3 (84.963, -29.21) -> (132.715, -29.21) construction
  circle A5 centre (57.531, 36.068) radius 1.7272 construction
  line L4 (-25.5336, -29.21) -> (147.9977, -29.21) construction
  line L5 (84.9503, 23.1654) -> (84.9503, -54.0444) construction
  line L6 (-212.471, 66.294) -> (212.471, 66.294) projected
  point P0 (0, 0)
  point P1 (0, 0)
  point P2 (-73.279, -29.21)
  dimension "d60" = 58.42
  dimension "d61" = 47.752
  dimension "d62" = 27.432
  dimension "d63" = 47.752
  dimension "d64" = 43.053
  dimension "d73" = 95.504
  dimension "d74" = 95.504
  dimension "d75" = 95.504
sketch "Sketch6" plane through (0, 0, 1.651) normal (0, 0, 1) x (1, 0, 0)
  line L0 (73.279, -29.21) -> (-149.3427, -29.21) construction
  line L1 (-132.7023, 25.4917) -> (-132.7023, -42.1158) construction
  point P0 (0, 0)
  point P1 (73.279, 29.21)
  point P2 (25.527, 29.21)
  point P3 (25.5336, -29.21)
  point P4 (-84.963, -29.21)
  point P5 (-132.715, -29.21)
hole "solid state relay holes" at (-132.715, -29.21, 1.651) at (-84.963, -29.21, 1.651) at (25.527, 29.21, 1.651) at (73.279, 29.21, 1.651) at (25.5336, -29.21, 1.651) at (73.279, -29.21, 1.651) direction (0, 0, -1) diameter 4.4958 end through all clearance for "Flat Head Machine Screw (82)" size "#8" standard "Ansi Unified Screw Threads"
properties part number "PDU_chassis_back"
